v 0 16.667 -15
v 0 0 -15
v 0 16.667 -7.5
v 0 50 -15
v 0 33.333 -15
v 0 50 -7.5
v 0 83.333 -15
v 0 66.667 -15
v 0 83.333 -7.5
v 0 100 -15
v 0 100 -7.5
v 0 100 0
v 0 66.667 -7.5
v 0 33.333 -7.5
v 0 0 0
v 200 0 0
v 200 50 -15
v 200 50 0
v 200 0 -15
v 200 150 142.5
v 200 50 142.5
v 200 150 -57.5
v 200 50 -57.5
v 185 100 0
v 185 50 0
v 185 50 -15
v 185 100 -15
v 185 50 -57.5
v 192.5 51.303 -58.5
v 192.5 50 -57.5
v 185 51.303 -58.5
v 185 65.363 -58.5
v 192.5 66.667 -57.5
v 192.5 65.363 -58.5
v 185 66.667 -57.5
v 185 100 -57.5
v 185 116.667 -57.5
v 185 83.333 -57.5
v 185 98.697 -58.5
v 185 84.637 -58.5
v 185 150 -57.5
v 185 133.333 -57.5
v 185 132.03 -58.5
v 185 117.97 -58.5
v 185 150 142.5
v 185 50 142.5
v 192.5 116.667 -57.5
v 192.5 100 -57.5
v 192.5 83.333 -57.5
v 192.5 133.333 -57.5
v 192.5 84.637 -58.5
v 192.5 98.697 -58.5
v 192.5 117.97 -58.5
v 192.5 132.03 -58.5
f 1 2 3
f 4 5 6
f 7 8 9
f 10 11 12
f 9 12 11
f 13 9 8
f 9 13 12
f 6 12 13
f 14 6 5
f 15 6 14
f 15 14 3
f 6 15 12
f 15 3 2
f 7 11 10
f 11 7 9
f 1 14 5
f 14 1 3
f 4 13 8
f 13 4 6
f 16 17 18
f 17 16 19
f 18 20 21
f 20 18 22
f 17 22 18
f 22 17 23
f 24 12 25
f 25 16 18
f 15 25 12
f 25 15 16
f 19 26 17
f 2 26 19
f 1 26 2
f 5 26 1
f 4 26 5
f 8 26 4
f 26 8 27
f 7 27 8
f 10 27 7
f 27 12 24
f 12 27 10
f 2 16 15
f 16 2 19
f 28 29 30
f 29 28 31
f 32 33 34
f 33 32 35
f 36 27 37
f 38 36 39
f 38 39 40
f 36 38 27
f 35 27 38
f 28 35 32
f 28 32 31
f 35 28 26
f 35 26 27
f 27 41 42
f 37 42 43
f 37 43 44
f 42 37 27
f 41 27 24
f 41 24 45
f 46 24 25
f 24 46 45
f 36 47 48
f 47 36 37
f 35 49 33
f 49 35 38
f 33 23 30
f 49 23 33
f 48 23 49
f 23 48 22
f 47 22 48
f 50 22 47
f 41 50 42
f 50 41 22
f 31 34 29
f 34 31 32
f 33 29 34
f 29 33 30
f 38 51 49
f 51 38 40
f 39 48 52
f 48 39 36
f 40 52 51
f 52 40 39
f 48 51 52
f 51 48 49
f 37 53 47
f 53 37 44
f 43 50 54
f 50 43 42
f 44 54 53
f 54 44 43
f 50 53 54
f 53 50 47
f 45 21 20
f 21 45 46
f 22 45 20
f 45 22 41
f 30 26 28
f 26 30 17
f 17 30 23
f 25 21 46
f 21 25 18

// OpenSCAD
$fn=50; // Increase detail level of curves

// Board dimensions
length = 200; // Length of the board in mm
height = 15; // Height (thickness) of the board in mm
width = 100; // Width of the board in mm

// Dovetail parameters
dovetail_count = 3; // Number of dovetails
dovetail_angle = 75; // Angle of the dovetail in degrees
dovetail_depth = height / 2; // Depth of the dovetails, half the board's thickness for simplicity

// Basic dovetail shape (for demonstration, assuming symmetry and simple proportions)
module dovetail() {
    mirror([1, 0, 0]) {
        linear_extrude(height = dovetail_depth) {
            polygon(points=[[0,0], [1,1/tan(dovetail_angle/2)], [1,width/(dovetail_count*2)-1/tan(dovetail_angle/2)], [0,width/(dovetail_count*2)]]);
        }
    }
}

// Board with male dovetails
module board_male() {
    difference() {
        // The board itself
        cube([length, width, height]);
        // Remove material to form the male part of the dovetails
        for (i = [1:2:dovetail_count*2-1]) {
            translate([0, i * width / (dovetail_count * 2), 0])
            dovetail();
        }
    }
}

// Board with female dovetails (slots)
module board_female() {
    union() {
        // The board itself, with cutouts for the dovetails
        cube([length, width, height]);
        // Add material where the dovetails fit
        for (i = [0:2:dovetail_count*2-2]) {
            translate([0, i * width / (dovetail_count * 2), height - dovetail_depth])
            dovetail();
        }
    }
}

// Position and render both boards for demonstration
translate([0, 0, -height])
board_male();
translate([length, width/2, -width/2 - height/2])
rotate([0, -90, 0])
board_female();
